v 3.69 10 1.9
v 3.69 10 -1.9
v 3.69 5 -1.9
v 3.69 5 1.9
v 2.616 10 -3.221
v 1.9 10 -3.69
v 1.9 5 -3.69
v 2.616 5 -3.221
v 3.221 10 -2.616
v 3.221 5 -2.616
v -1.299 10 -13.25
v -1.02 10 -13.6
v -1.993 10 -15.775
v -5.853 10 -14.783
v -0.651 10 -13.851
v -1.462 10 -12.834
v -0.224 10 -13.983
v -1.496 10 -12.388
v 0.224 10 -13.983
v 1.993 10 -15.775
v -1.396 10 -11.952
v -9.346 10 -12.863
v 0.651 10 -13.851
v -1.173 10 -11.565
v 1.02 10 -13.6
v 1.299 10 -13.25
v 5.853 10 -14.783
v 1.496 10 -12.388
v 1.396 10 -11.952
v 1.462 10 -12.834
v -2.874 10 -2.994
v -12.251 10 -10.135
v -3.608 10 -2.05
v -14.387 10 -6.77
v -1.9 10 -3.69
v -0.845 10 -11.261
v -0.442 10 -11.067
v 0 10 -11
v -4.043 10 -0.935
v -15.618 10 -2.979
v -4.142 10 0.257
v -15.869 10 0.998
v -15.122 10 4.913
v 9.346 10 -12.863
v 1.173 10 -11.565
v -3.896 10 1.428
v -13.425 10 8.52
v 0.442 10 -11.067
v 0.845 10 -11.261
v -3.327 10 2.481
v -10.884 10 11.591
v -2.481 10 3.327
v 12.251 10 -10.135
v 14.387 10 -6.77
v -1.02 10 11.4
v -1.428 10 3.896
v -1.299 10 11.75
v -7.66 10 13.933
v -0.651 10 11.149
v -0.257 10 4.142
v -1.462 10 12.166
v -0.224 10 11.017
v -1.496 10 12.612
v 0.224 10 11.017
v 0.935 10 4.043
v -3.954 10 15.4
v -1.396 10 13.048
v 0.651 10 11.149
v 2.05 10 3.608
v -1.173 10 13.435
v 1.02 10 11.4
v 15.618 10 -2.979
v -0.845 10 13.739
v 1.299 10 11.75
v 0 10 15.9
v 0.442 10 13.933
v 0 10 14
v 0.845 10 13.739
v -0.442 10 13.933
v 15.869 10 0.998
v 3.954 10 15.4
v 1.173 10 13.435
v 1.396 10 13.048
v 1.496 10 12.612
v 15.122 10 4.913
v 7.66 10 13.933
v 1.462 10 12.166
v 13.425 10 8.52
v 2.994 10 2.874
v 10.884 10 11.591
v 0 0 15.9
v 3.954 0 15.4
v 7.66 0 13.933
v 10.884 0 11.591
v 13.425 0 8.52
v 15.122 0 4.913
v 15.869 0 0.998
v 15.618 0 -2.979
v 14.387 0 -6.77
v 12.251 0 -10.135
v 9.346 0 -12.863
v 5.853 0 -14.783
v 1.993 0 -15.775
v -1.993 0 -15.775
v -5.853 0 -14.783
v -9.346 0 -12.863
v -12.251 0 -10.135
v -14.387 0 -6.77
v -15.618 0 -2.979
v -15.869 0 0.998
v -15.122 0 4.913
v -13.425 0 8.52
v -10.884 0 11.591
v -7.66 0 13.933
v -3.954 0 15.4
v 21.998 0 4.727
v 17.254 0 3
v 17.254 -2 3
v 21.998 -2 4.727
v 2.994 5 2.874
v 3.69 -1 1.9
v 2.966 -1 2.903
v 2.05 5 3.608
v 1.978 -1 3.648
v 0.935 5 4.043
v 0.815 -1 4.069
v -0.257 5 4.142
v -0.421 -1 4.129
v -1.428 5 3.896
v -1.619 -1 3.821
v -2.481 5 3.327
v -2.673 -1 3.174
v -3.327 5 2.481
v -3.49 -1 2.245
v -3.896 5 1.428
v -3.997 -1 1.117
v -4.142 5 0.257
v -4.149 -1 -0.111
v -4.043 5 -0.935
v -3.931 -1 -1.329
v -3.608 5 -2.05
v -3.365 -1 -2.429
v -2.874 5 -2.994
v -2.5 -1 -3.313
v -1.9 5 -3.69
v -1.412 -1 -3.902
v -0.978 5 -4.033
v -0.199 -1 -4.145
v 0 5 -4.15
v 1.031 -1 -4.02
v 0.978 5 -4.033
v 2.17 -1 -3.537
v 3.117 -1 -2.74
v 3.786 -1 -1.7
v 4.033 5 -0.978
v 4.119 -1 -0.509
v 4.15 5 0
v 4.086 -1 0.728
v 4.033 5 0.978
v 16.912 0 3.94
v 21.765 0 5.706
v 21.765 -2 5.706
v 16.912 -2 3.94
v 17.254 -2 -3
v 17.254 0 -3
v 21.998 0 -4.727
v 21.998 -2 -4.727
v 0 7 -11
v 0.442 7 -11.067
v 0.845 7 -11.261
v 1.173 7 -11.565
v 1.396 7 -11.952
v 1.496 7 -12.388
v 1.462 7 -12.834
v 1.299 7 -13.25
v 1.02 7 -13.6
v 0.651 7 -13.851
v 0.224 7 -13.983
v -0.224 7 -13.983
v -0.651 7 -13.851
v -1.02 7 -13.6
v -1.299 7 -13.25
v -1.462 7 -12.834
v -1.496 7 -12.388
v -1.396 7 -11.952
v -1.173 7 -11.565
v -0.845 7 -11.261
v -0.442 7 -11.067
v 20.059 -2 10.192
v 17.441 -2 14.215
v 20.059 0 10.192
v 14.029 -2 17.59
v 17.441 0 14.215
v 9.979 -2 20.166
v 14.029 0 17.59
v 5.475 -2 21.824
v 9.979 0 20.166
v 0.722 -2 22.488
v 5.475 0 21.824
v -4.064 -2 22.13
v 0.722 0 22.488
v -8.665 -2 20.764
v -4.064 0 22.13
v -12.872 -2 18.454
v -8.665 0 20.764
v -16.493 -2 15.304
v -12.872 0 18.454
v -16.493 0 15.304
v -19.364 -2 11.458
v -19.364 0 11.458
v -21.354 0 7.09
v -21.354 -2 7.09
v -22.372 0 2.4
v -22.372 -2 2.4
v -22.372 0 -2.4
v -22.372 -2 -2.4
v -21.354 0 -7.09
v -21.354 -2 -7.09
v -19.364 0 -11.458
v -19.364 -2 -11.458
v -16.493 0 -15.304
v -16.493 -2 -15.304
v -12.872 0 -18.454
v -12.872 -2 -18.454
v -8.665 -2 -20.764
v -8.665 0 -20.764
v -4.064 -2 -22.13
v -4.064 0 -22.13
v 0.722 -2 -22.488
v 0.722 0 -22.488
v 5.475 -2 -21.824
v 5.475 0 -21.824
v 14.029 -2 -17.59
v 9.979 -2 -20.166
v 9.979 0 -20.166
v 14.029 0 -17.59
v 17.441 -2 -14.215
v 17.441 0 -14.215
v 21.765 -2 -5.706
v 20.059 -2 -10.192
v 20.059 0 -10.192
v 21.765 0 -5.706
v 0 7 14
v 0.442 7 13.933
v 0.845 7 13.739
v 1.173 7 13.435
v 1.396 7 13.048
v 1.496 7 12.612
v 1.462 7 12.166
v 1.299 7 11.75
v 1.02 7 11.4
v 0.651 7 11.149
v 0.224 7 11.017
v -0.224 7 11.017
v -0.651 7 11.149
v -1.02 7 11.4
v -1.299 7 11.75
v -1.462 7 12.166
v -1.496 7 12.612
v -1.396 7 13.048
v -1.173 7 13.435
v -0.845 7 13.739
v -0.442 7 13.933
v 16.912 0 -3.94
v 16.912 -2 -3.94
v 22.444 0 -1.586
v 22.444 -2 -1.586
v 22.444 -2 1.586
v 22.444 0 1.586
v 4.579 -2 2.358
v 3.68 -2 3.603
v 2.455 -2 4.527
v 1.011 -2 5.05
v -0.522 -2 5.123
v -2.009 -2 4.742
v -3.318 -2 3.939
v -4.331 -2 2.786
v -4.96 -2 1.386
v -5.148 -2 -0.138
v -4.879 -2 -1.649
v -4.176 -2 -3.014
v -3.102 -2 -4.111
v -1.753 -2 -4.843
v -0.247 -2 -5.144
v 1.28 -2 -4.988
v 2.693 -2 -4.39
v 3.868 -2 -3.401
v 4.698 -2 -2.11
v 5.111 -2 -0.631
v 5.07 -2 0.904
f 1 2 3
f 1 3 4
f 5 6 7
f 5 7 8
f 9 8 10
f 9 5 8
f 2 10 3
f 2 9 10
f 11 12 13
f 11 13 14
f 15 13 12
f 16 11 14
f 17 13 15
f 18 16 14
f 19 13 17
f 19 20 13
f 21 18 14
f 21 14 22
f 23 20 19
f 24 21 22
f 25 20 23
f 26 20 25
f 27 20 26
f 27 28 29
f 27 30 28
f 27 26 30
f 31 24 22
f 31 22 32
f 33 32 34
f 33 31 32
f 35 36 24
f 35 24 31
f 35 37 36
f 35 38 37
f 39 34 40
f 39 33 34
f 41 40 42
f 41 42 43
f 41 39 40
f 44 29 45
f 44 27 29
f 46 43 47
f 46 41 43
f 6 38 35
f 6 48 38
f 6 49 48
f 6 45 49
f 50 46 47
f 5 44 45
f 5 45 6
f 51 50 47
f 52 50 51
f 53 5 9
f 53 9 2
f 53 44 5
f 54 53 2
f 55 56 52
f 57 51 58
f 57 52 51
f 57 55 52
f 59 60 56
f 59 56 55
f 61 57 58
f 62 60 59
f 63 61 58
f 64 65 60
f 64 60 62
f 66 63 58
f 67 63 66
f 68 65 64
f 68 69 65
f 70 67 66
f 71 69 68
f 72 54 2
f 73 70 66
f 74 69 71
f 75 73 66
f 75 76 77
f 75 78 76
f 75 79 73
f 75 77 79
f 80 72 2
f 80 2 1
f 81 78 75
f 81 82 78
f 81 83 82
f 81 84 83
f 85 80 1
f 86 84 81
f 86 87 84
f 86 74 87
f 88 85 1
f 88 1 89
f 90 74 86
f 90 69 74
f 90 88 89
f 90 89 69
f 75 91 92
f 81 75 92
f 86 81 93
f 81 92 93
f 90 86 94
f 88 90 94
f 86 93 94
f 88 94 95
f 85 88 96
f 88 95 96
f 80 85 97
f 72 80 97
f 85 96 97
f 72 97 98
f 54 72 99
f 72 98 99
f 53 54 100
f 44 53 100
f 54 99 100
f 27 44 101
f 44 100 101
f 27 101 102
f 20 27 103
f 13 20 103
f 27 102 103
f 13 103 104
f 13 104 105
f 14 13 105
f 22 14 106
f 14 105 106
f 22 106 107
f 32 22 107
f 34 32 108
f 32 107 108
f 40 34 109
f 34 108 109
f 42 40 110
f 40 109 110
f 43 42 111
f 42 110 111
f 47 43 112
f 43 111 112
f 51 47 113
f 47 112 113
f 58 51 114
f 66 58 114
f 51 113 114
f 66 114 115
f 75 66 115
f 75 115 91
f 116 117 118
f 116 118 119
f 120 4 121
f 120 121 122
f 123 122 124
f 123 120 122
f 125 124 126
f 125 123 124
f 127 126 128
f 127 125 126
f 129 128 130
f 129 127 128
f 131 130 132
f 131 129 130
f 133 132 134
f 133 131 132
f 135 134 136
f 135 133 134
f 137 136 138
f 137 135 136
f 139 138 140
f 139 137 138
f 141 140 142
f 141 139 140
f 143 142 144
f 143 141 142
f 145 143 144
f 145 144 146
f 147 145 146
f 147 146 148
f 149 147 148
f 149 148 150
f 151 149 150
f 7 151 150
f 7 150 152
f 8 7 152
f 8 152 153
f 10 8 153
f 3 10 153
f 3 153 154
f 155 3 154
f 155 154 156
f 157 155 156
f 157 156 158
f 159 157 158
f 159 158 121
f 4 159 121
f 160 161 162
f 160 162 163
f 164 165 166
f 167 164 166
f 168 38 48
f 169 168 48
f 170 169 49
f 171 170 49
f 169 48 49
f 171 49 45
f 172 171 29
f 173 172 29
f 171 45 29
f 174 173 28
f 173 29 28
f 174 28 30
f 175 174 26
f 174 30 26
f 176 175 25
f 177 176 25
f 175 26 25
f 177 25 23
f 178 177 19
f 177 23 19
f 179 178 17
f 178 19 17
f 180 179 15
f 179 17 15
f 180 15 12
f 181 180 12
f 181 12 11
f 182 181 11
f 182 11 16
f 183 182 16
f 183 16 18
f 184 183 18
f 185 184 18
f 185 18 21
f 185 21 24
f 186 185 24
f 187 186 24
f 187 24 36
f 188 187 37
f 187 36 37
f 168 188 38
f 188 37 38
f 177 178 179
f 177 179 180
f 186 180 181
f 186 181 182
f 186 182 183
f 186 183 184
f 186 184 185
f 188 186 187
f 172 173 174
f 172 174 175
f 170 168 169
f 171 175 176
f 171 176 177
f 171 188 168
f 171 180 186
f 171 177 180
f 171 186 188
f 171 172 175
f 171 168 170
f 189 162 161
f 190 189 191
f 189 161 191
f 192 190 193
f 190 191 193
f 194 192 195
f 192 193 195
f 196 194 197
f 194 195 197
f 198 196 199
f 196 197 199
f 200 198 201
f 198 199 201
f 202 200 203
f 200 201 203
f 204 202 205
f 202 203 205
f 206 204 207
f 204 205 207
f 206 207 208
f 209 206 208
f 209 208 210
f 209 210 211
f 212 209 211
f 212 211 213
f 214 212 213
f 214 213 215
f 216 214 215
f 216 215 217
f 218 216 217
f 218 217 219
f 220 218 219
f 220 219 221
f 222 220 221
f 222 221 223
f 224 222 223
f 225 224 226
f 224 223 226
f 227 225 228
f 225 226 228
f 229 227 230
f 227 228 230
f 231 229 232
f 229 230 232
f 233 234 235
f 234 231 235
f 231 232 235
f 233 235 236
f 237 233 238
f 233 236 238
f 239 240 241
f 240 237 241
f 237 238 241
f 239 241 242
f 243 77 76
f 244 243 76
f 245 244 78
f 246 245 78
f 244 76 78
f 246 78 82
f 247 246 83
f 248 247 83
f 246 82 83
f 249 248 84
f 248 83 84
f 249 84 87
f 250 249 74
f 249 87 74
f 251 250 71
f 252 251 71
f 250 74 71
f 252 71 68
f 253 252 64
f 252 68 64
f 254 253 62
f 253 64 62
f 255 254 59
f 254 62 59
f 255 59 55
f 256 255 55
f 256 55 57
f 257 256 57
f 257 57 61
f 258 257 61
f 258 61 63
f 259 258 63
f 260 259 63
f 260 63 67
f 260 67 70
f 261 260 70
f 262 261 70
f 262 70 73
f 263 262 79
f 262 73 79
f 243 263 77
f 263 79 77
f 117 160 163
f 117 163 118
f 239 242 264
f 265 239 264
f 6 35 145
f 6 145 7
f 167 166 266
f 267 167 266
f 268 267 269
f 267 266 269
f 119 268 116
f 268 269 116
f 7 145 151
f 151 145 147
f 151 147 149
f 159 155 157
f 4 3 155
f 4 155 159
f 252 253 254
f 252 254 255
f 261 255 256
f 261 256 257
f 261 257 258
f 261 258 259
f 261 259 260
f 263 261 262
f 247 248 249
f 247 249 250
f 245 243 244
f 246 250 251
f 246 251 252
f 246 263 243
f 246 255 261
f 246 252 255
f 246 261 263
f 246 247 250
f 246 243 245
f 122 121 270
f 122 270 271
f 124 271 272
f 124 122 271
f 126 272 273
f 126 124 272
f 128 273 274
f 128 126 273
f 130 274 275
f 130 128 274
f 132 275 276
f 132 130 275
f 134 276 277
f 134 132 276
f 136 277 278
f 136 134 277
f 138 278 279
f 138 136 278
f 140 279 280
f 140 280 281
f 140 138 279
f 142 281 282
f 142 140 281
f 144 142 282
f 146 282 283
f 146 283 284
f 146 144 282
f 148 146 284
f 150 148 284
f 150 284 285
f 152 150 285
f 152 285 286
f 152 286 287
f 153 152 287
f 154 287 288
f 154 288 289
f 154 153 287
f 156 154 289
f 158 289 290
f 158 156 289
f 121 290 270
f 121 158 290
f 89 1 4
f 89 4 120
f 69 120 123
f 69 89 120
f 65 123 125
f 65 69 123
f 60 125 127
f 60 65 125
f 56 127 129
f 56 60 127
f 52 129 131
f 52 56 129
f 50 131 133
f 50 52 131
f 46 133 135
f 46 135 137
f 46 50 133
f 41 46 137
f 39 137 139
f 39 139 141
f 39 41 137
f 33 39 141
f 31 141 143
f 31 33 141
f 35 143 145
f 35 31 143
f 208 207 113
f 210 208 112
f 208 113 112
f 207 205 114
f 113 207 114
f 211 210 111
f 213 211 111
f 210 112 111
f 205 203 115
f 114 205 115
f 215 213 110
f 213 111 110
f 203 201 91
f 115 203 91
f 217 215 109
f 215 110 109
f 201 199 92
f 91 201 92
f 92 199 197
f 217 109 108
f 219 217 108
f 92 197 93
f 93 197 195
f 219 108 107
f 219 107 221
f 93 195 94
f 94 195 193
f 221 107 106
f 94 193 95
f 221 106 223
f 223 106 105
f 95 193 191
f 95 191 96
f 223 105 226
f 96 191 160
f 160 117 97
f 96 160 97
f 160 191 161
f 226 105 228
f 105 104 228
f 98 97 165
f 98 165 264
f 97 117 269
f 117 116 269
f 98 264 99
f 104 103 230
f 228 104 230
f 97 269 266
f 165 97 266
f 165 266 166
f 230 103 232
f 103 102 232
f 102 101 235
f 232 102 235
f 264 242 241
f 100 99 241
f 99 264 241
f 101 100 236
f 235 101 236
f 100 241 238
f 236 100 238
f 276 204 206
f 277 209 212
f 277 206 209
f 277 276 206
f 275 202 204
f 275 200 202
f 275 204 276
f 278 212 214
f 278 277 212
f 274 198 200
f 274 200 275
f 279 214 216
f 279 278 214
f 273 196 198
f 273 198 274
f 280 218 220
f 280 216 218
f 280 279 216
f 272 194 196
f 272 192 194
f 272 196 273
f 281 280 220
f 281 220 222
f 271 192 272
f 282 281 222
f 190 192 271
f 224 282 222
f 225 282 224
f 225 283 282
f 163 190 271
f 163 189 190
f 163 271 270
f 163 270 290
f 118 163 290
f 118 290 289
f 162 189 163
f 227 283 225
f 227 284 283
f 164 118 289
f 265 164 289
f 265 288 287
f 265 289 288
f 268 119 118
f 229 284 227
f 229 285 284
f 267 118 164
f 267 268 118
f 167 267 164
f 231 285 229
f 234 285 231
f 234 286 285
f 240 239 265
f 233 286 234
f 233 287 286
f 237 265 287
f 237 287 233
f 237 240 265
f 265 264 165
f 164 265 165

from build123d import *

# Parameters (mm, degrees)
SKETCH_1_R          = 15.9
EXTRUDE_1_DEPTH     = 10
SKETCH_2_R          = 22.5
EXTRUDE_2_DEPTH     = 2
SKETCH_3_R          = 1.5
CUT_EXTRUDE_3_DEPTH = 3
CUT_EXTRUDE_4_DEPTH = 3
CUT_EXTRUDE_5_DEPTH = 5
CUT_EXTRUDE_START   = -7
SKETCH_6_R          = 4.15
CUT_EXTRUDE_6_DEPTH = 7
CHAMFER_1_SIZE      = 1


with BuildPart() as part:
    # Эскиз1 → Вытянуть1 (new body)
    with BuildSketch(Plane(origin=(0, 0, 0), x_dir=(1, 0, 0), z_dir=(0, 1, 0))):
        with Locations(Location((0, 0, 0), (0, 0, 270))):
            Circle(SKETCH_1_R)
    extrude(amount=EXTRUDE_1_DEPTH)

    # Эскиз2 → Вытянуть2 (add)
    with BuildSketch(Plane.XZ):
        with Locations(Location((0, 0, 0), (0, 0, 270))):
            Circle(SKETCH_2_R)
    extrude(amount=EXTRUDE_2_DEPTH)

    # Эскиз3 → Вытянуть3 (cut)
    with BuildSketch(Plane(origin=(0, 10, 0), x_dir=(1, 0, 0), z_dir=(0, 1, 0))):
        with Locations(Location((0, 12.5, 0), (0, 0, 270))):
            Circle(SKETCH_3_R)
        with Locations(Location((0, -12.5, 0), (0, 0, 270))):
            Circle(SKETCH_3_R)
    extrude(amount=-CUT_EXTRUDE_3_DEPTH, mode=Mode.SUBTRACT)

    # Эскиз4 → Вытянуть4 (cut)
    with BuildSketch(Plane(origin=(0, 0, 0), x_dir=(1, 0, 0), z_dir=(0, 1, 0))):
        with BuildLine():
            Line((21.764513428, 5.705782614), (16.912221051, 3.939692621))
            Line((16.912221051, 3.939692621), (17.254241194, 3))
            Line((17.254241194, 3), (21.997944585, 4.726566834))
            ThreePointArc((21.997944585, 4.726566834), (21.886705981, 5.217480357), (21.764513428, 5.705782614))
        make_face()
        with BuildLine():
            Line((17.254241194, -3), (21.997944585, -4.726566834))
            ThreePointArc((21.997944585, -4.726566834), (21.886705981, -5.217480357), (21.764513428, -5.705782614))
            Line((21.764513428, -5.705782614), (16.912221051, -3.939692621))
            Line((16.912221051, -3.939692621), (17.254241194, -3))
        make_face()
    extrude(amount=-CUT_EXTRUDE_4_DEPTH, mode=Mode.SUBTRACT)

    # Эскиз5 → Вытянуть5 (cut)
    with BuildSketch(Plane(origin=(0, 10, 0), x_dir=(1, 0, 0), z_dir=(0, 1, 0))):
        with BuildLine():
            Line((3.689512163, 1.9), (3.689512163, -1.9))
            ThreePointArc((3.689512163, -1.9), (-2.934493142, -2.934493142), (-1.9, 3.689512163))
            Line((-1.9, 3.689512163), (1.9, 3.689512163))
            ThreePointArc((1.9, 3.689512163), (2.934493142, 2.934493142), (3.689512163, 1.9))
        make_face()
    extrude(amount=-CUT_EXTRUDE_5_DEPTH, mode=Mode.SUBTRACT)

    # Эскиз6 → Вытянуть6 (cut)
    with BuildSketch(Plane.XZ.offset(2).offset(CUT_EXTRUDE_START)):
        with Locations(Location((0, 0, 0), (0, 0, 27.247255186))):
            Circle(SKETCH_6_R)
    extrude(amount=CUT_EXTRUDE_6_DEPTH, mode=Mode.SUBTRACT)

    # Фаска1
    chamfer_1_edges = [part.edges().sort_by_distance(p)[0] for p in [
        (-3.689512163, -2, -1.9),
    ]]
    chamfer(chamfer_1_edges, length=CHAMFER_1_SIZE)


solid = part.part
